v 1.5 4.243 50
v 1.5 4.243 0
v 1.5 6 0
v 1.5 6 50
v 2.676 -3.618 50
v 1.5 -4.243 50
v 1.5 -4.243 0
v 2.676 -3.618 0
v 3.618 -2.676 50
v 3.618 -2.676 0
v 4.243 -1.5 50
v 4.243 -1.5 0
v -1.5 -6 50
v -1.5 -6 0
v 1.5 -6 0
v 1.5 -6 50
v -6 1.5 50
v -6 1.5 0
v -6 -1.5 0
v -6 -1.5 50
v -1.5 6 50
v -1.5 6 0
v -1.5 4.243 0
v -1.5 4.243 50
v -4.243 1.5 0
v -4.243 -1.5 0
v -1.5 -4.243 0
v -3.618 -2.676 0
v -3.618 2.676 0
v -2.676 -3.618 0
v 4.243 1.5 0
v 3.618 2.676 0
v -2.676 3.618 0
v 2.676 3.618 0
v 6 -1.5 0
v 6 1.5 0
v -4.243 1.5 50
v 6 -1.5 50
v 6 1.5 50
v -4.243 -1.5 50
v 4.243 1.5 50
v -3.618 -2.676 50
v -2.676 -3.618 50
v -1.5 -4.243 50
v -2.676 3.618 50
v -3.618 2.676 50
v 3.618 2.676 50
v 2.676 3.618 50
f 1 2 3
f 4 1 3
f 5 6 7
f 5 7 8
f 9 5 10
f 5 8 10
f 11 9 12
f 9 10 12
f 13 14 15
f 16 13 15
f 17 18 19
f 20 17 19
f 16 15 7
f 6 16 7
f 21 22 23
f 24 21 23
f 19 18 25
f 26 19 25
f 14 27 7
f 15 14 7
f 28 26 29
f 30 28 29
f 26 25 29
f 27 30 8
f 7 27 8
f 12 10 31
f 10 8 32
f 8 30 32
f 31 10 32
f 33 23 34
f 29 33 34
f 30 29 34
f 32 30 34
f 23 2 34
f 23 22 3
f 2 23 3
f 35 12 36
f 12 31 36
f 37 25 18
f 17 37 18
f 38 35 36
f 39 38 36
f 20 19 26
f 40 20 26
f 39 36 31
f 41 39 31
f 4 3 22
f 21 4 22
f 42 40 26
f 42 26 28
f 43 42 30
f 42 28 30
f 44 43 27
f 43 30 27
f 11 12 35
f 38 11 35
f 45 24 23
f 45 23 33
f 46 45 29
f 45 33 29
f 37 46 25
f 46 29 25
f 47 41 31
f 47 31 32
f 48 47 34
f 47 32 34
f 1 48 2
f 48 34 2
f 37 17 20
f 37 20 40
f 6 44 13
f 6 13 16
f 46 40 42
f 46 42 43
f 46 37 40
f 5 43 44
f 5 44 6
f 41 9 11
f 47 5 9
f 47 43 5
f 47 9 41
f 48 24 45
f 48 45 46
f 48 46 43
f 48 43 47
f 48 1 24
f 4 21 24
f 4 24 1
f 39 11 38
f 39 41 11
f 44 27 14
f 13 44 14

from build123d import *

# Parameters (mm, degrees)
F0_W     = 3
F0_H     = 3
F1_DEPTH = 50


with BuildPart() as f1:
    # F0 (on Top) → F1 (new body)
    with BuildSketch(Plane.XY):
        with BuildLine():
            ThreePointArc((-1.5, 4.2426406871), (0, 4.5), (1.5, 4.2426406871))
            Line((1.5, 4.2426406871), (1.5, 6))
            Line((1.5, 6), (-1.5, 6))
            Line((-1.5, 6), (-1.5, 4.2426406871))
        make_face()
        with BuildLine():
            Line((1.5, -6), (1.5, -4.2426406871))
            ThreePointArc((1.5, -4.2426406871), (0, -4.5), (-1.5, -4.2426406871))
            Line((-1.5, -4.2426406871), (-1.5, -6))
            Line((-1.5, -6), (1.5, -6))
        make_face()
        Rectangle(F0_W, F0_H)
        with BuildLine():
            ThreePointArc((-1.5, -4.2426406871), (0, -4.5), (1.5, -4.2426406871))
            Line((1.5, -4.2426406871), (1.5, -1.5))
            Line((1.5, -1.5), (-1.5, -1.5))
            Line((-1.5, -1.5), (-1.5, -4.2426406871))
        make_face()
        with BuildLine():
            Line((1.5, 1.5), (1.5, 4.2426406871))
            ThreePointArc((1.5, 4.2426406871), (0, 4.5), (-1.5, 4.2426406871))
            Line((-1.5, 4.2426406871), (-1.5, 1.5))
            Line((-1.5, 1.5), (1.5, 1.5))
        make_face()
        with BuildLine():
            Line((1.5, 1.5), (4.2426406871, 1.5))
            ThreePointArc((4.2426406871, 1.5), (3.1819805153, 3.1819805153), (1.5, 4.2426406871))
            Line((1.5, 4.2426406871), (1.5, 1.5))
        make_face()
        with BuildLine():
            ThreePointArc((4.2426406871, -1.5), (4.4351935184, -0.7609589043), (4.5, 0))
            ThreePointArc((4.5, 0), (4.4351935184, 0.7609589043), (4.2426406871, 1.5))
            Line((4.2426406871, 1.5), (1.5, 1.5))
            Line((1.5, 1.5), (1.5, -1.5))
            Line((1.5, -1.5), (4.2426406871, -1.5))
        make_face()
        with BuildLine():
            ThreePointArc((1.5, -4.2426406871), (3.1819805153, -3.1819805153), (4.2426406871, -1.5))
            Line((4.2426406871, -1.5), (1.5, -1.5))
            Line((1.5, -1.5), (1.5, -4.2426406871))
        make_face()
        with BuildLine():
            ThreePointArc((-4.2426406871, -1.5), (-3.1819805153, -3.1819805153), (-1.5, -4.2426406871))
            Line((-1.5, -4.2426406871), (-1.5, -1.5))
            Line((-1.5, -1.5), (-4.2426406871, -1.5))
        make_face()
        with BuildLine():
            Line((-1.5, -1.5), (-1.5, 1.5))
            Line((-1.5, 1.5), (-4.2426406871, 1.5))
            ThreePointArc((-4.2426406871, 1.5), (-4.5, 0), (-4.2426406871, -1.5))
            Line((-4.2426406871, -1.5), (-1.5, -1.5))
        make_face()
        with BuildLine():
            Line((-1.5, 1.5), (-1.5, 4.2426406871))
            ThreePointArc((-1.5, 4.2426406871), (-3.1819805153, 3.1819805153), (-4.2426406871, 1.5))
            Line((-4.2426406871, 1.5), (-1.5, 1.5))
        make_face()
        with BuildLine():
            ThreePointArc((-4.2426406871, -1.5), (-4.5, 0), (-4.2426406871, 1.5))
            Line((-4.2426406871, 1.5), (-6, 1.5))
            Line((-6, 1.5), (-6, -1.5))
            Line((-6, -1.5), (-4.2426406871, -1.5))
        make_face()
        with BuildLine():
            ThreePointArc((4.2426406871, 1.5), (4.4351935184, 0.7609589043), (4.5, 0))
            ThreePointArc((4.5, 0), (4.4351935184, -0.7609589043), (4.2426406871, -1.5))
            Line((4.2426406871, -1.5), (6, -1.5))
            Line((6, -1.5), (6, 1.5))
            Line((6, 1.5), (4.2426406871, 1.5))
        make_face()
    extrude(amount=F1_DEPTH)


solid = f1.part
